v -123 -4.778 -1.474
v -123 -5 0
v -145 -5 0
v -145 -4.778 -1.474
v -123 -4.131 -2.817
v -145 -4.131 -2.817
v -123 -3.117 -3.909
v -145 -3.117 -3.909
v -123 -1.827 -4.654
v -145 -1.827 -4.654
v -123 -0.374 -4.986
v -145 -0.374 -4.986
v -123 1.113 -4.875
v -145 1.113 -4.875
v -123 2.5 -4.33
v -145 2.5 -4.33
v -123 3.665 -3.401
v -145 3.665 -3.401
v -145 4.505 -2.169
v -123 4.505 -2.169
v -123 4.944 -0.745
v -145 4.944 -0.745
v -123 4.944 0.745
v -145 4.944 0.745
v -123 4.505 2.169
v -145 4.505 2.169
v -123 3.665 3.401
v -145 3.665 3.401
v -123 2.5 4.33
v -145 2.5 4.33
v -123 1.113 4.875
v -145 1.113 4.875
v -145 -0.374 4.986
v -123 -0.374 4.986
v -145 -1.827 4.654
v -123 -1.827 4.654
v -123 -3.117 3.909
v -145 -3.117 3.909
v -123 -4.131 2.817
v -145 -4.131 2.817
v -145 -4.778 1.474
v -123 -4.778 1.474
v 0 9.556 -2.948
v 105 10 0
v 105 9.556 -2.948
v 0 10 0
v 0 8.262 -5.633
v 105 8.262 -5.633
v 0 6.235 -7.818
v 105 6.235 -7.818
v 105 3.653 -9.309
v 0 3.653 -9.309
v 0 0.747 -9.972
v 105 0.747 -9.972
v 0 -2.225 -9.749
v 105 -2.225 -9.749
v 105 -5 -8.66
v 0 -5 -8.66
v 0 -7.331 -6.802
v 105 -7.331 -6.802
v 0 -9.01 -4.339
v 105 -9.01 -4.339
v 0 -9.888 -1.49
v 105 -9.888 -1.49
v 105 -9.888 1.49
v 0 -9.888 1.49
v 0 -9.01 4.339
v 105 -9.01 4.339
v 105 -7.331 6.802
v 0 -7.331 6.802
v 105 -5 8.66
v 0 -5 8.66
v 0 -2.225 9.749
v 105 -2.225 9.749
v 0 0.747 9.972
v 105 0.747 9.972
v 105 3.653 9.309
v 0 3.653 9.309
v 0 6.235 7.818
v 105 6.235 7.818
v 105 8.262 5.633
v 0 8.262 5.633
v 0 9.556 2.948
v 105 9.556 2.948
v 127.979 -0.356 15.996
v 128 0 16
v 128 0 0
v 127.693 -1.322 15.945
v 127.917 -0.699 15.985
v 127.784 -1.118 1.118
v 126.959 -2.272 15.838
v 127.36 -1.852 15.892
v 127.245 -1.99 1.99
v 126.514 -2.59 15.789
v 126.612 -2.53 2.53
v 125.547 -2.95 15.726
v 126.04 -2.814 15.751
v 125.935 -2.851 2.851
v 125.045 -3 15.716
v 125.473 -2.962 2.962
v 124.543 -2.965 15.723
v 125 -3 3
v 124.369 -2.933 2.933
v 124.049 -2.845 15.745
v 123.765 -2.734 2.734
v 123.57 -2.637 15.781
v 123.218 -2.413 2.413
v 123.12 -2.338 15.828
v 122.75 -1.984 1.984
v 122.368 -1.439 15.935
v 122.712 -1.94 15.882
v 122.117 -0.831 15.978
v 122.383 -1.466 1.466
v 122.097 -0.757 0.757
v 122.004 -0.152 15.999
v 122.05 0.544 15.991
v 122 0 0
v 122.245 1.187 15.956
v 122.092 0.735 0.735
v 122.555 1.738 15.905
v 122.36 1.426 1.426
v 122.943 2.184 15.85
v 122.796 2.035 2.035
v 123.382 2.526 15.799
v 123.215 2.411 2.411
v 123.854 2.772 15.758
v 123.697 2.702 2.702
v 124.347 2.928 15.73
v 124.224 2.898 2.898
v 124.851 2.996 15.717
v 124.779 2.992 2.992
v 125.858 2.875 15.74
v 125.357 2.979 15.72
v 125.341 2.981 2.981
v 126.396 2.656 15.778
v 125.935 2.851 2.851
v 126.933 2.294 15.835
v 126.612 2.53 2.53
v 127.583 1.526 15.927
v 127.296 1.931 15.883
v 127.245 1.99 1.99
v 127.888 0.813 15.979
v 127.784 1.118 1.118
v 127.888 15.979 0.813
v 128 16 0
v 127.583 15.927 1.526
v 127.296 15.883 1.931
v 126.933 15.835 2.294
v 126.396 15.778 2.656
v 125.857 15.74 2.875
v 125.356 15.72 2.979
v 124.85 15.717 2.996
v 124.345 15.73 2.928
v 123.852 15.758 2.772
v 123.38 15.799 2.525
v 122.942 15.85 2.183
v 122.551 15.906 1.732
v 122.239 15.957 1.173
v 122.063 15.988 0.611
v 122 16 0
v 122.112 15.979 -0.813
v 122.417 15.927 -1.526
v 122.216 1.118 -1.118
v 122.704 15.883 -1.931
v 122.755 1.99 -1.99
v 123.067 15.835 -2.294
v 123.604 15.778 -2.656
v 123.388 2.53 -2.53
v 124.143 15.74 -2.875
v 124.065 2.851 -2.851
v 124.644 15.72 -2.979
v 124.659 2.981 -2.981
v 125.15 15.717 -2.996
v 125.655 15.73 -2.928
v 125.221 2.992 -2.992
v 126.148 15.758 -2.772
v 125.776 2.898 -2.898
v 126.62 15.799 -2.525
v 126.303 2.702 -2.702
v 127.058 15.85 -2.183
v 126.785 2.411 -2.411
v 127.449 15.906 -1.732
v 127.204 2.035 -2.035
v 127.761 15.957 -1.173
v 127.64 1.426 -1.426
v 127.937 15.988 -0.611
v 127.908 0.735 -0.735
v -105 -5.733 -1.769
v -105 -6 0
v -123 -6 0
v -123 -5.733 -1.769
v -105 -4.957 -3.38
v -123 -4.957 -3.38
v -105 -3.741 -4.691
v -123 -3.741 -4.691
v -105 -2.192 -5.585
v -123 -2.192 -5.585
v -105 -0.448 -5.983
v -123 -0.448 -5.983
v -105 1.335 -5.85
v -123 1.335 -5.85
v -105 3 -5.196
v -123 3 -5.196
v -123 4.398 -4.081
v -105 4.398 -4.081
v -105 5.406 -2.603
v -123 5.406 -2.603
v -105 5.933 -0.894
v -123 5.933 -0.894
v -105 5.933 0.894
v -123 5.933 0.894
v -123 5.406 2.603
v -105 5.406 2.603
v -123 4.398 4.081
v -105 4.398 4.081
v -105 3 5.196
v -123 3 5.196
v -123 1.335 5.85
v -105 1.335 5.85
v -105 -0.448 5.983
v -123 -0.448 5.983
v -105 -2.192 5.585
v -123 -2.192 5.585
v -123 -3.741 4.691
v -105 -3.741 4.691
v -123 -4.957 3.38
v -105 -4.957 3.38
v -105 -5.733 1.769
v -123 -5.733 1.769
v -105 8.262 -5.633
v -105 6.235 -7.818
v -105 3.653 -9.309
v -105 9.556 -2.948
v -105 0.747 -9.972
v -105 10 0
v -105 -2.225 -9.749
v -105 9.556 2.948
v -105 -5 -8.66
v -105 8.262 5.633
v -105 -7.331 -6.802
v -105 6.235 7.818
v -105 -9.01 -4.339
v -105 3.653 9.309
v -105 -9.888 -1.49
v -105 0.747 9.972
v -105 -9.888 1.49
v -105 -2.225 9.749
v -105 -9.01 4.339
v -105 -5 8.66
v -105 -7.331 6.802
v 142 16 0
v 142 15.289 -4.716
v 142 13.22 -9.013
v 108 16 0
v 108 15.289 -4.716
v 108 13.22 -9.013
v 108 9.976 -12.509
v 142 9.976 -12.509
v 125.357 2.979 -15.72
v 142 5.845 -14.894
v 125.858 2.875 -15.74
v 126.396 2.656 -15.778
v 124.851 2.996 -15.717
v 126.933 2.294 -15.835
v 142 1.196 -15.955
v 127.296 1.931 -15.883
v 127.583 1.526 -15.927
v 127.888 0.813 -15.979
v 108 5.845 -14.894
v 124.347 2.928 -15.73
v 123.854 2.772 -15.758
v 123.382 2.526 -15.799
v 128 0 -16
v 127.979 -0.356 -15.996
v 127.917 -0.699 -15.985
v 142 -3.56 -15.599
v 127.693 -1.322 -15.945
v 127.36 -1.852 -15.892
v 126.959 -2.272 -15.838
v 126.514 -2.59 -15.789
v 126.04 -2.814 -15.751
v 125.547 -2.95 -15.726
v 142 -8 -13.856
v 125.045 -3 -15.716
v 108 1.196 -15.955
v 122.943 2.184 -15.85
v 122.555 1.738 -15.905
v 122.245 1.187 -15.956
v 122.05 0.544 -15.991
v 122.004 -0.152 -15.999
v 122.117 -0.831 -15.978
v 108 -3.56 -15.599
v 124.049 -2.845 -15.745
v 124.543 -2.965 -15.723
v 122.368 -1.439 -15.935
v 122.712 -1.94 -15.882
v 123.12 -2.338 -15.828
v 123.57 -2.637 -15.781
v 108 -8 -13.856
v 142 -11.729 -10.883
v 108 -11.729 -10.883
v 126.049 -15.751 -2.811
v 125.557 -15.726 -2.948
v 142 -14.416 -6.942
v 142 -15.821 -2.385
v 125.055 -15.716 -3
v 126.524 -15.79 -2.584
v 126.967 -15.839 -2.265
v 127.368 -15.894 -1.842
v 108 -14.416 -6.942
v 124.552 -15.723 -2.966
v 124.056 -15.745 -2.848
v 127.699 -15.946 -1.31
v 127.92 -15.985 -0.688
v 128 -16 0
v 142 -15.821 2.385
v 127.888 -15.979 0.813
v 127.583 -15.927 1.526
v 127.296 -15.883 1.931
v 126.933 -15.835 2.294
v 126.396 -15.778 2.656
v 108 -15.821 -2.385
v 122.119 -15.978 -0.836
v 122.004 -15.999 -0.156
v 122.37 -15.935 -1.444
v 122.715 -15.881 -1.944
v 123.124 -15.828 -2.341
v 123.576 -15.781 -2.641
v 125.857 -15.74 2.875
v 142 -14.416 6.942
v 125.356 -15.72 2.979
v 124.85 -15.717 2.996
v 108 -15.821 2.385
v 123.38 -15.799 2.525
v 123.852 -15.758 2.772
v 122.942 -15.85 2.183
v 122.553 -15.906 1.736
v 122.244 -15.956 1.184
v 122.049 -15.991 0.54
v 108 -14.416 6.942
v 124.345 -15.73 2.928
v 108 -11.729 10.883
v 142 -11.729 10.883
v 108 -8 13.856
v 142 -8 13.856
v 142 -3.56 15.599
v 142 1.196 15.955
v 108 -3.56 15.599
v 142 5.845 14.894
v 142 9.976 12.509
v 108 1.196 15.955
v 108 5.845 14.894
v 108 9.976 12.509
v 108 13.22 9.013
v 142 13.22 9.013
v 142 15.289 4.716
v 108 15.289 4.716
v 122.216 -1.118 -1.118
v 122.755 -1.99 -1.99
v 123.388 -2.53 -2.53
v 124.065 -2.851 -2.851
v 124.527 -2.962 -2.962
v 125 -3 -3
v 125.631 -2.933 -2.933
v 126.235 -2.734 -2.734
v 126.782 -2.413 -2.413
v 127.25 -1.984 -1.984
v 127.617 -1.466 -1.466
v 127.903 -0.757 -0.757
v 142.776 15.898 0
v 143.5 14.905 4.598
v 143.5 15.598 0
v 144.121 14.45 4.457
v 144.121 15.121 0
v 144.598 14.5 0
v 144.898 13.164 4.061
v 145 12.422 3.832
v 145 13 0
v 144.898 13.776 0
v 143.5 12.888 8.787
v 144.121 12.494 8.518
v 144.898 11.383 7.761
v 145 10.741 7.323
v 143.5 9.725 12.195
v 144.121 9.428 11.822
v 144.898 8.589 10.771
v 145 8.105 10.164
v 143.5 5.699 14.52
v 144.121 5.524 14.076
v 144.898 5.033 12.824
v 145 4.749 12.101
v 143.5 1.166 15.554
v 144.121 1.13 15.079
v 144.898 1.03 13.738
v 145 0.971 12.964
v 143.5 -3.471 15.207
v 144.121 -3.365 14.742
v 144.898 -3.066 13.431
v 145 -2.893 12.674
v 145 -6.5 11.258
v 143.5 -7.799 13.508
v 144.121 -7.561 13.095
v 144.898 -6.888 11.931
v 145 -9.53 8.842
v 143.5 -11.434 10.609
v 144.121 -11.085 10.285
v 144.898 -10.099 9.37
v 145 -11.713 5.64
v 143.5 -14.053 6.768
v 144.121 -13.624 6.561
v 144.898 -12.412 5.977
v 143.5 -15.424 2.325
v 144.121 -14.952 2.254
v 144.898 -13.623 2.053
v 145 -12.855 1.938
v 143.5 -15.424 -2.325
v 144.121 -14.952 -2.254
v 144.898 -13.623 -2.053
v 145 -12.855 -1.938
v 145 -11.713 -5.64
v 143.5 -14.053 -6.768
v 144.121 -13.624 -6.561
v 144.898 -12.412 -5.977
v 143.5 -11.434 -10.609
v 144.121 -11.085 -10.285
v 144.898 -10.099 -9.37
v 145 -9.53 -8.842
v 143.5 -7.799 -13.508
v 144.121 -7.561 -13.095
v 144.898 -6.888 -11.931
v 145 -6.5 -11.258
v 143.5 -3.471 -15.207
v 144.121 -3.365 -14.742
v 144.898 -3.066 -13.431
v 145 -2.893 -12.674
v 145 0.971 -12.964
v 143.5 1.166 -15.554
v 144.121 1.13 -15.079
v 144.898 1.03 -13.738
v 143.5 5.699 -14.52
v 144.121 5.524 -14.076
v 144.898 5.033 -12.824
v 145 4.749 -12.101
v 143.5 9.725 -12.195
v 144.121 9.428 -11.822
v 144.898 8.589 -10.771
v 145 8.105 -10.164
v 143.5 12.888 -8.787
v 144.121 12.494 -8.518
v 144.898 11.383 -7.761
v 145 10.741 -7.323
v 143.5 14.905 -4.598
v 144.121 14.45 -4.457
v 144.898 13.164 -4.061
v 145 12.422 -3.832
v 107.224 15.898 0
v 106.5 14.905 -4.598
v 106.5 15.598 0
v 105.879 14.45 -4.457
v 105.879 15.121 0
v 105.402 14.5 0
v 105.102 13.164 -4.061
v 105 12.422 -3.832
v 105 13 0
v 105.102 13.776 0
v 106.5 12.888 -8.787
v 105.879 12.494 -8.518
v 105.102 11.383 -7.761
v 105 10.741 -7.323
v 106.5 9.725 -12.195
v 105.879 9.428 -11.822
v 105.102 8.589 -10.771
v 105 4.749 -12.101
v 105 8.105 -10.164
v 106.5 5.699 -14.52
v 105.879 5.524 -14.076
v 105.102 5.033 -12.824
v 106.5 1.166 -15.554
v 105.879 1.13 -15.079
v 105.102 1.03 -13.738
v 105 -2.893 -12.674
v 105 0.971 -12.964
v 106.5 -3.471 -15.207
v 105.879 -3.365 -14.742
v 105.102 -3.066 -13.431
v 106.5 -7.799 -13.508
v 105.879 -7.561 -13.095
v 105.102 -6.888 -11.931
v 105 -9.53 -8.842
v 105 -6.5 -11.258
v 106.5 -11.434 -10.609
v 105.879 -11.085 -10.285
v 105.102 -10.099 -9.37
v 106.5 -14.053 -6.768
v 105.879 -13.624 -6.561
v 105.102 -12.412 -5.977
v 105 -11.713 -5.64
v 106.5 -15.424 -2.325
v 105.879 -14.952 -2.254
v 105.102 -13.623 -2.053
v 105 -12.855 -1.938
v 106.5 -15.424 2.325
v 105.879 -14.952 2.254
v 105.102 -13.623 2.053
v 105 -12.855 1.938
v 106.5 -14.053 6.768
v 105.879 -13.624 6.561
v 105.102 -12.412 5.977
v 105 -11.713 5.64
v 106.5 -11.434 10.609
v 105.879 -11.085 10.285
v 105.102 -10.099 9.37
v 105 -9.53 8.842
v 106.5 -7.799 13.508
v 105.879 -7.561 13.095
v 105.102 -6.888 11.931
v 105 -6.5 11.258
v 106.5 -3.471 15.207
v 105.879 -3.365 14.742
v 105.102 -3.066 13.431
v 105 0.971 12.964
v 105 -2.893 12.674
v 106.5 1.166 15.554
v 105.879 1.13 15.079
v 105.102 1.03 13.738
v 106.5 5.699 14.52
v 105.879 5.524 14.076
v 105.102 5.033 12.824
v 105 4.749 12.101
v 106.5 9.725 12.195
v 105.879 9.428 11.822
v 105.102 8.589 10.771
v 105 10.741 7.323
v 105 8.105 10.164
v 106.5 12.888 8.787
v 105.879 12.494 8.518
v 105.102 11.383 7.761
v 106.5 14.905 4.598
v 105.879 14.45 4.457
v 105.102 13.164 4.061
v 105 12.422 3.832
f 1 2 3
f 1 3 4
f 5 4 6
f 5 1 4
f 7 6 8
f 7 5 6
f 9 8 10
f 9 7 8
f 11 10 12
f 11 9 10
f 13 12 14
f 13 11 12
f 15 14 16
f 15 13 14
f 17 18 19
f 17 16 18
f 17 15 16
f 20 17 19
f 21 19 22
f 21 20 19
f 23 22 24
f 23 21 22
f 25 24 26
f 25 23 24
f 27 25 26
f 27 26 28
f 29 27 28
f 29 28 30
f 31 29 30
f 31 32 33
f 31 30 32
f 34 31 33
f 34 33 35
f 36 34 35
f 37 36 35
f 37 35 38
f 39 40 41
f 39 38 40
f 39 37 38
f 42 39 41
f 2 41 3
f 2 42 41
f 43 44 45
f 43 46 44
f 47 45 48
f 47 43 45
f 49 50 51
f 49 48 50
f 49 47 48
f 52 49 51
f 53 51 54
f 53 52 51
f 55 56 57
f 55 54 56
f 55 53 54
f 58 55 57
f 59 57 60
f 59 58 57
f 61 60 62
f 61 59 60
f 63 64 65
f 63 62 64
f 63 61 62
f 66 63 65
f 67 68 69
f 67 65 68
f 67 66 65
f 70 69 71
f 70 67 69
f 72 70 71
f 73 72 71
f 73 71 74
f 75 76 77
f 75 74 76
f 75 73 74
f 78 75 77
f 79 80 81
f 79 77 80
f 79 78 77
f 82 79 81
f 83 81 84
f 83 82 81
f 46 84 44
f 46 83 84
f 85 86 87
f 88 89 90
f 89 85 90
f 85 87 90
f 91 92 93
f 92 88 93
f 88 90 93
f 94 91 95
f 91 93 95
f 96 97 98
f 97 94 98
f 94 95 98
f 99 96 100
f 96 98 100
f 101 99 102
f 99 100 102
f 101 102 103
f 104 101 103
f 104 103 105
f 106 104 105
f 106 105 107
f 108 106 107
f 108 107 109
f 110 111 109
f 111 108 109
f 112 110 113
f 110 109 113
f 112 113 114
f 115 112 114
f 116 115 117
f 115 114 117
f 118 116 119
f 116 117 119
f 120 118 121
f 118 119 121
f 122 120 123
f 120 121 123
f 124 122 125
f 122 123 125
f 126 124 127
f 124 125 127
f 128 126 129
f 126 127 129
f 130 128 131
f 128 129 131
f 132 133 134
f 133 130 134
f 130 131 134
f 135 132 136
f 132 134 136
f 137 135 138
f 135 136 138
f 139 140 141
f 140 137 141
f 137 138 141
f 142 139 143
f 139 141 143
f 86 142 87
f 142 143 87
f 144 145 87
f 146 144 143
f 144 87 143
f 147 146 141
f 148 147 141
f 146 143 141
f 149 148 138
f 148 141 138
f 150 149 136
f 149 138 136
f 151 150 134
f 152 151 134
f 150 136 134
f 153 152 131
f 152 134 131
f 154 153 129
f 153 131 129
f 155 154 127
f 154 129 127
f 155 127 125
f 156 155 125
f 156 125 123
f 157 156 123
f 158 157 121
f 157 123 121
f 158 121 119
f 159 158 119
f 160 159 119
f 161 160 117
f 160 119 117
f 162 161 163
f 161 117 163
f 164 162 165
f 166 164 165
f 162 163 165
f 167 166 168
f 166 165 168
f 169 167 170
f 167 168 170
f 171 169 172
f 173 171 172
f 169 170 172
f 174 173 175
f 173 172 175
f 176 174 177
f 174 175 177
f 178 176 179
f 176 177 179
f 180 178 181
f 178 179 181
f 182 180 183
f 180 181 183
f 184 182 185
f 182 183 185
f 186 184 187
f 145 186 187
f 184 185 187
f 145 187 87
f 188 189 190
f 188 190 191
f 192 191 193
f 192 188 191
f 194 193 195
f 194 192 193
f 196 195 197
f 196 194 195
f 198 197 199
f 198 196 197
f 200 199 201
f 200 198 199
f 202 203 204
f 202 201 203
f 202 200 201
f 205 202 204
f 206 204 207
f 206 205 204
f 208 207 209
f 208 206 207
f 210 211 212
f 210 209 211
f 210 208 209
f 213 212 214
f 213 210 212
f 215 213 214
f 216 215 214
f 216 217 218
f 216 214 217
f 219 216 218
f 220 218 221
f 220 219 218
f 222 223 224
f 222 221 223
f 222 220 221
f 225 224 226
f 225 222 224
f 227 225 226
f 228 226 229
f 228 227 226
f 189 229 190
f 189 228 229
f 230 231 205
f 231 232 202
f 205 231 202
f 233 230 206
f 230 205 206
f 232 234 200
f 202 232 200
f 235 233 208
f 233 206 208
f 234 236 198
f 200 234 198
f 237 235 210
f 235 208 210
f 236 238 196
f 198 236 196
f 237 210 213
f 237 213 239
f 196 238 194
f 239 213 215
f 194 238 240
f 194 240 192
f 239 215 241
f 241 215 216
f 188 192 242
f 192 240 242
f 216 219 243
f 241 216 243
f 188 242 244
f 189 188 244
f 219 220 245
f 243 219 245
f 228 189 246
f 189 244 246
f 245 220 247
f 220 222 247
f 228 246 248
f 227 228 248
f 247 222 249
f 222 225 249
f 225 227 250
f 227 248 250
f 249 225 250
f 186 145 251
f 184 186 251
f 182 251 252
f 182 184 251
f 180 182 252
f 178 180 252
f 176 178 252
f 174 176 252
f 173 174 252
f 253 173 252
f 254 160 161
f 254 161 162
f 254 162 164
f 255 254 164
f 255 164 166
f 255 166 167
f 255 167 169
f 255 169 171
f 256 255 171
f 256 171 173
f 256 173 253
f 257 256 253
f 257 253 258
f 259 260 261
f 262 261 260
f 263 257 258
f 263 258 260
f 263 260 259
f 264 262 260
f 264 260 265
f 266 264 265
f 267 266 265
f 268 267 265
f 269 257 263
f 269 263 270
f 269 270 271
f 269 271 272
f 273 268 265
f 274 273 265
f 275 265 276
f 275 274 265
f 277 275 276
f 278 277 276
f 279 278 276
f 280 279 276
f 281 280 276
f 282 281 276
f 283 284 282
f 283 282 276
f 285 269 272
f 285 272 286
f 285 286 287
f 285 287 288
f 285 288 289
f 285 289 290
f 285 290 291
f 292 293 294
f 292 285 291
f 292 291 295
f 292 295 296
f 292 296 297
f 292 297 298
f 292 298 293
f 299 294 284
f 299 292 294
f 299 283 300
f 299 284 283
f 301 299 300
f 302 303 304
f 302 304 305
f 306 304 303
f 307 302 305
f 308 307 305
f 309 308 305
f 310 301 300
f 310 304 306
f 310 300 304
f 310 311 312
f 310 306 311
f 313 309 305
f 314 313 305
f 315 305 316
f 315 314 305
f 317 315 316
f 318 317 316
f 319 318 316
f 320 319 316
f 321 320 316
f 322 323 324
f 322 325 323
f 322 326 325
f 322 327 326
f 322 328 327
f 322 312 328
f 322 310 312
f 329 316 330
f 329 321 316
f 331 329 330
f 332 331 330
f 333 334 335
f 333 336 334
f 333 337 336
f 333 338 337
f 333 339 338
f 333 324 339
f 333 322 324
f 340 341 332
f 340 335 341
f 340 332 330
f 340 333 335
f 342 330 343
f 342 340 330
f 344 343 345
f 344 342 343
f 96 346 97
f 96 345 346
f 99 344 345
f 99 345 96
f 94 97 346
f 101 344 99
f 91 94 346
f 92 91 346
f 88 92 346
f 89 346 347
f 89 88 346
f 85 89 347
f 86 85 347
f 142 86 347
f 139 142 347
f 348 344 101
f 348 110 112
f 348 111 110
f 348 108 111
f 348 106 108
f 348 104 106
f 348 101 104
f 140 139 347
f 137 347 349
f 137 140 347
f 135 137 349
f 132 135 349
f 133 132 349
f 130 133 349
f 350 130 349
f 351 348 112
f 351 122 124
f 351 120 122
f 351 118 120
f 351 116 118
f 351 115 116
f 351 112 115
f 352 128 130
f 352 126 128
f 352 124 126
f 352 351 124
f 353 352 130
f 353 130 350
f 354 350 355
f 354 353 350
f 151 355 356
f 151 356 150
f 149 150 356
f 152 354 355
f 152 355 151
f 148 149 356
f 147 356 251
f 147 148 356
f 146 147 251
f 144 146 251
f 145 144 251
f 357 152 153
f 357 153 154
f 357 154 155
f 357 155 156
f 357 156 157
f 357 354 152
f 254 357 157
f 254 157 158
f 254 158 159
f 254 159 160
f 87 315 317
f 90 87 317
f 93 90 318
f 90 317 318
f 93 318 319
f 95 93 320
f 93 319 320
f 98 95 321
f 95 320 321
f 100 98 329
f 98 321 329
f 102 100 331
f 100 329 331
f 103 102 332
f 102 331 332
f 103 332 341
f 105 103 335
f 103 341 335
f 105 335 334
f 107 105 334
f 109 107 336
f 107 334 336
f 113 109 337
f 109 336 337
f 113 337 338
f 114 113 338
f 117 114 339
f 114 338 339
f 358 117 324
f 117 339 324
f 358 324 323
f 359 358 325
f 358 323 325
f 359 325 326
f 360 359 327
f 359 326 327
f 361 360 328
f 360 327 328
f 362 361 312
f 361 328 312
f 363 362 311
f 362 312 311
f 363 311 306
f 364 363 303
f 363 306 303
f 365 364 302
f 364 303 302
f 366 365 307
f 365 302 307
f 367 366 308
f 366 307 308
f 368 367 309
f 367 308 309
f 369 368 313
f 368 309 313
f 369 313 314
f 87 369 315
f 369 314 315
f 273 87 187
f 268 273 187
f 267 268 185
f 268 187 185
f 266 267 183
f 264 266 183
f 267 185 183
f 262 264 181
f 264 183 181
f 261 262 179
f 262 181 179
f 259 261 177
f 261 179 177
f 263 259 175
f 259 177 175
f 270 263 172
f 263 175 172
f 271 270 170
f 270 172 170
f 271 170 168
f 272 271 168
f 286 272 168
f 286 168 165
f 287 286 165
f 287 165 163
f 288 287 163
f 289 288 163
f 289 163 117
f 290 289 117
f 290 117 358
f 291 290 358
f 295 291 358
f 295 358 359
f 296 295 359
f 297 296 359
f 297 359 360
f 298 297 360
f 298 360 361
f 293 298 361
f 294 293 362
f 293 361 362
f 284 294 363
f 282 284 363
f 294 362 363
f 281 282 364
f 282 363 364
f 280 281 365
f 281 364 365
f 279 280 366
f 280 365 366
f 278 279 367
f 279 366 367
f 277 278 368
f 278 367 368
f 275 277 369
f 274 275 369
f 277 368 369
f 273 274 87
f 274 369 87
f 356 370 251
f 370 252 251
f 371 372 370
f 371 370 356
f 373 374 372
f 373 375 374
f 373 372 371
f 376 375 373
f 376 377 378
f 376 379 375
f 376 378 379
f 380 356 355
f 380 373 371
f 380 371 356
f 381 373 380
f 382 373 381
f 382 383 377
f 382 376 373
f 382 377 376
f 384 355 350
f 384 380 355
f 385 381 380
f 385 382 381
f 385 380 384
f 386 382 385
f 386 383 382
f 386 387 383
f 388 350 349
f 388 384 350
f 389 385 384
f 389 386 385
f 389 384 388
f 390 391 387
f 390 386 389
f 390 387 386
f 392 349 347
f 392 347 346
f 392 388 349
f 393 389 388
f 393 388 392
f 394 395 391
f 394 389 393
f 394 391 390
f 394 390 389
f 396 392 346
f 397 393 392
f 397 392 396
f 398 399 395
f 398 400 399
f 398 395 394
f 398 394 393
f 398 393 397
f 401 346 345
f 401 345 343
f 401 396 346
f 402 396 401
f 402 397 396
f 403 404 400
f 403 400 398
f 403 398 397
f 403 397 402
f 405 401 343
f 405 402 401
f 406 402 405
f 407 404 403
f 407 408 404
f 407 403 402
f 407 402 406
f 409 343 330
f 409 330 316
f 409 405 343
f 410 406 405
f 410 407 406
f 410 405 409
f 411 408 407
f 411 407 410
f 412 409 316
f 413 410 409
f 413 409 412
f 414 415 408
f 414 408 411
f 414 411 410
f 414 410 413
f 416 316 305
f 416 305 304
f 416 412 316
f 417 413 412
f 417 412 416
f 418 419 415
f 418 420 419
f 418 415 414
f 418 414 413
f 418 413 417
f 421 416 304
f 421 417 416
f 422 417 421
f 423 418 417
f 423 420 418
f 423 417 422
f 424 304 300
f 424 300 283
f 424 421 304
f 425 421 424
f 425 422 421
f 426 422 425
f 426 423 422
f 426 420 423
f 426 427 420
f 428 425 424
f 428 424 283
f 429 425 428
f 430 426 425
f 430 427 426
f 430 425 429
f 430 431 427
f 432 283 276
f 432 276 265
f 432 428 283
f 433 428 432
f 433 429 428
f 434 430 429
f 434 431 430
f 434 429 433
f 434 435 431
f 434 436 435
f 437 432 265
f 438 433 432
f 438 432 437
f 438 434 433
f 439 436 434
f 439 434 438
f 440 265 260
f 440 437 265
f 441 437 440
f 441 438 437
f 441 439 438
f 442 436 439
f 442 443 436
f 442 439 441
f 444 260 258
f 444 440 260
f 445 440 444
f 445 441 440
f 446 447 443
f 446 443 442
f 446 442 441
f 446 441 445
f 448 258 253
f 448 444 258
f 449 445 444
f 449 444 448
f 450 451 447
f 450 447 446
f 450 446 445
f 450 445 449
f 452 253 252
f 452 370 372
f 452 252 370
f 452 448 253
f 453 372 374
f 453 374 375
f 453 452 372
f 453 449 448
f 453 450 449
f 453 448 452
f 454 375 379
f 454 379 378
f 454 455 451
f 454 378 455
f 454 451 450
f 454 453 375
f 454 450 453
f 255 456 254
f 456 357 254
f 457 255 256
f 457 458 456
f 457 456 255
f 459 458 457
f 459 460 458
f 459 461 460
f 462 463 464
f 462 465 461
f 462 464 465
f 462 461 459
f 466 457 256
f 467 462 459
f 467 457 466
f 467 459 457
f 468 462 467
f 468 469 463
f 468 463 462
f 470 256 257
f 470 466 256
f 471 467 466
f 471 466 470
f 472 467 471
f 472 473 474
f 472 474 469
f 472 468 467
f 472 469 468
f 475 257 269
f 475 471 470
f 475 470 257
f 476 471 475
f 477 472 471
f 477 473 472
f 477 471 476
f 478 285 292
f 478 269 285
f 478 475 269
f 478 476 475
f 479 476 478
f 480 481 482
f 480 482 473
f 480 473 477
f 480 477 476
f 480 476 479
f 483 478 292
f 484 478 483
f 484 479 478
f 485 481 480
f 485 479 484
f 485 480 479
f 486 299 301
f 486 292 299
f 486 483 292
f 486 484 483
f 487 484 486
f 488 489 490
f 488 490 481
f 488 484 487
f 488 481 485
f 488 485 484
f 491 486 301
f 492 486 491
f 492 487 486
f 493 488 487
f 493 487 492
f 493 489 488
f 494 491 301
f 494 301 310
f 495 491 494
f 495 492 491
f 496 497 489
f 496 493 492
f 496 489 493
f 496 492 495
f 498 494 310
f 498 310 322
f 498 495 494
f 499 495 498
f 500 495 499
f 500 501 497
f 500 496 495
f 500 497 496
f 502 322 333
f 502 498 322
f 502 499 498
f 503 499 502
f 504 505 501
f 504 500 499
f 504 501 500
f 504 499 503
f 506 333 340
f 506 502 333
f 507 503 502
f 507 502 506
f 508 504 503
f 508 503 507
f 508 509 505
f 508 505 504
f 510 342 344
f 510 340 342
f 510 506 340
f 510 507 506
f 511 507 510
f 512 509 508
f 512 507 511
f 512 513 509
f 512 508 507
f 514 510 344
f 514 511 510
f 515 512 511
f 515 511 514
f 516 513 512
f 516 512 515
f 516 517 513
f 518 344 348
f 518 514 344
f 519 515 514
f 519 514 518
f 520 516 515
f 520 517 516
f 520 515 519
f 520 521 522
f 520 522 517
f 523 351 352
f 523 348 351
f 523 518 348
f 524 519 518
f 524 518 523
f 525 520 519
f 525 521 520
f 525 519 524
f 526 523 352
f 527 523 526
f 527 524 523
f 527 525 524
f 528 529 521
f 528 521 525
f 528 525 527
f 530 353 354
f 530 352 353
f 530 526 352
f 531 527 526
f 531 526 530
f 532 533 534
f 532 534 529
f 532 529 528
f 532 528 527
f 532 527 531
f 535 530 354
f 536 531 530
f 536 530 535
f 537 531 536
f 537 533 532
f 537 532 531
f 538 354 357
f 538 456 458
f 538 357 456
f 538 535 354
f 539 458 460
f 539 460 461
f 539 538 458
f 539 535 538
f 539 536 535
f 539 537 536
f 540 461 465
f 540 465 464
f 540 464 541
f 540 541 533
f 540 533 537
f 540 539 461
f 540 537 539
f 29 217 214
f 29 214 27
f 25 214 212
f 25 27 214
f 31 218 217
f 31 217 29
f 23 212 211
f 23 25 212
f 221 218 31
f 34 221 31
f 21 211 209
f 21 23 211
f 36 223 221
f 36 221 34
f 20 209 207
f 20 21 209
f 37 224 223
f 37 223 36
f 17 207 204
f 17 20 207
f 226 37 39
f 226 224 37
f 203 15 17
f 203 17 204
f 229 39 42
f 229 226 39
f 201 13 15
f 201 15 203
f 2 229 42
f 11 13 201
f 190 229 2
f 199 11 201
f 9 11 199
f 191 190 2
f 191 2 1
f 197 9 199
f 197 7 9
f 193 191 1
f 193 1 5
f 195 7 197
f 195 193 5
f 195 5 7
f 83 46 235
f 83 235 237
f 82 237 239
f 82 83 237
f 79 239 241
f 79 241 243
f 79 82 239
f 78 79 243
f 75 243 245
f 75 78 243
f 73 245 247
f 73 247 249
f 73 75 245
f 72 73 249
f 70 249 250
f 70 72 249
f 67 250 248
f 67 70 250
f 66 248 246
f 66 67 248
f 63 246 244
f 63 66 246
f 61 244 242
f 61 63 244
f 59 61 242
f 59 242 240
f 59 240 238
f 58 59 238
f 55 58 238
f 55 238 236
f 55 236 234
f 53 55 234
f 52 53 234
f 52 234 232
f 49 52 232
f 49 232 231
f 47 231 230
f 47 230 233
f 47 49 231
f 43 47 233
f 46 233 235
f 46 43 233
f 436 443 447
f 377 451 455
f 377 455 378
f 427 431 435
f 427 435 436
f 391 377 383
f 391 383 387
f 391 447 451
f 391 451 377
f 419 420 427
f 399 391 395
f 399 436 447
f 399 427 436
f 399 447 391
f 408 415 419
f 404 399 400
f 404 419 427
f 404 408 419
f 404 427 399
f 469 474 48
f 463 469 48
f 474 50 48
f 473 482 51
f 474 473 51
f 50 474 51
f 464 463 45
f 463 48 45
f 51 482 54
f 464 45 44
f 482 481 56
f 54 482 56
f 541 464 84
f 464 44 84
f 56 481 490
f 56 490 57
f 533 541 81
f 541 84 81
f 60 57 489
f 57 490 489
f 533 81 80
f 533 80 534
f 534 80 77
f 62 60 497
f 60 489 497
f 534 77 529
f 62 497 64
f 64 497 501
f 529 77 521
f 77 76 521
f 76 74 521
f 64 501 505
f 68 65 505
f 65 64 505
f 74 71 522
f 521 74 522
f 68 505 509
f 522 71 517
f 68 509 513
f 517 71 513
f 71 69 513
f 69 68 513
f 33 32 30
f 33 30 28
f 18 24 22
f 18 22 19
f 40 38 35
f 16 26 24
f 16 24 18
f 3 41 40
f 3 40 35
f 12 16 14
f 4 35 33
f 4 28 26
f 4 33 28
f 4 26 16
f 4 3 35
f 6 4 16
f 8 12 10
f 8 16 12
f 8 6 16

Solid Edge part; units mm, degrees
sketch "Sketch1" plane through (0, 0, 0) normal (1, 0, 0) x (0, 1, 0)
  circle A0 centre (0, 0) radius 10
extrude "Protrusion1" add sketch "Sketch1" along normal mid plane 210
sketch "Sketch2" plane through (-105, 0, 0) normal (-1, 0, 0) x (0, -1, 0)
  circle A0 centre (0, 0) radius 6
extrude "ExtrudedProtrusion_2" add sketch "Sketch2" along normal blind 18
sketch "Sketch3" plane through (-123, 0, 0) normal (-1, 0, 0) x (0, -1, 0)
  circle A0 centre (0, 0) radius 5
extrude "ExtrudedProtrusion_3" add sketch "Sketch3" along normal blind 22
sketch "Sketch4" plane through (105, 0, 0) normal (1, 0, 0) x (0, 1, 0)
  circle A0 centre (0, 0) radius 16
extrude "ExtrudedProtrusion_4" add sketch "Sketch4" along normal blind 40
cosmetic_thread "Thread1" size "Tr 10 x 2"
cosmetic_thread "Thread_2" size "Tr 20 x 4" thread depth 170
fillet "Round_1" radius 3 2 edges at (145, -16, 0) (105, -16, 0)
sketch "Sketch5" plane through (0, 0, 0) normal (0, -1, 0) x (1, 0, 0)
  circle A0 centre (125, 0) radius 3
extrude "ExtrudedCutout_2" cut sketch "Sketch5" along normal mid plane 57.4711
sketch "Sketch6" plane through (0, 0, 0) normal (0, 0, 1) x (1, 0, 0)
  circle A0 centre (125, 0) radius 3
extrude "ExtrudedCutout_3" cut sketch "Sketch6" along normal mid plane 101.3588
